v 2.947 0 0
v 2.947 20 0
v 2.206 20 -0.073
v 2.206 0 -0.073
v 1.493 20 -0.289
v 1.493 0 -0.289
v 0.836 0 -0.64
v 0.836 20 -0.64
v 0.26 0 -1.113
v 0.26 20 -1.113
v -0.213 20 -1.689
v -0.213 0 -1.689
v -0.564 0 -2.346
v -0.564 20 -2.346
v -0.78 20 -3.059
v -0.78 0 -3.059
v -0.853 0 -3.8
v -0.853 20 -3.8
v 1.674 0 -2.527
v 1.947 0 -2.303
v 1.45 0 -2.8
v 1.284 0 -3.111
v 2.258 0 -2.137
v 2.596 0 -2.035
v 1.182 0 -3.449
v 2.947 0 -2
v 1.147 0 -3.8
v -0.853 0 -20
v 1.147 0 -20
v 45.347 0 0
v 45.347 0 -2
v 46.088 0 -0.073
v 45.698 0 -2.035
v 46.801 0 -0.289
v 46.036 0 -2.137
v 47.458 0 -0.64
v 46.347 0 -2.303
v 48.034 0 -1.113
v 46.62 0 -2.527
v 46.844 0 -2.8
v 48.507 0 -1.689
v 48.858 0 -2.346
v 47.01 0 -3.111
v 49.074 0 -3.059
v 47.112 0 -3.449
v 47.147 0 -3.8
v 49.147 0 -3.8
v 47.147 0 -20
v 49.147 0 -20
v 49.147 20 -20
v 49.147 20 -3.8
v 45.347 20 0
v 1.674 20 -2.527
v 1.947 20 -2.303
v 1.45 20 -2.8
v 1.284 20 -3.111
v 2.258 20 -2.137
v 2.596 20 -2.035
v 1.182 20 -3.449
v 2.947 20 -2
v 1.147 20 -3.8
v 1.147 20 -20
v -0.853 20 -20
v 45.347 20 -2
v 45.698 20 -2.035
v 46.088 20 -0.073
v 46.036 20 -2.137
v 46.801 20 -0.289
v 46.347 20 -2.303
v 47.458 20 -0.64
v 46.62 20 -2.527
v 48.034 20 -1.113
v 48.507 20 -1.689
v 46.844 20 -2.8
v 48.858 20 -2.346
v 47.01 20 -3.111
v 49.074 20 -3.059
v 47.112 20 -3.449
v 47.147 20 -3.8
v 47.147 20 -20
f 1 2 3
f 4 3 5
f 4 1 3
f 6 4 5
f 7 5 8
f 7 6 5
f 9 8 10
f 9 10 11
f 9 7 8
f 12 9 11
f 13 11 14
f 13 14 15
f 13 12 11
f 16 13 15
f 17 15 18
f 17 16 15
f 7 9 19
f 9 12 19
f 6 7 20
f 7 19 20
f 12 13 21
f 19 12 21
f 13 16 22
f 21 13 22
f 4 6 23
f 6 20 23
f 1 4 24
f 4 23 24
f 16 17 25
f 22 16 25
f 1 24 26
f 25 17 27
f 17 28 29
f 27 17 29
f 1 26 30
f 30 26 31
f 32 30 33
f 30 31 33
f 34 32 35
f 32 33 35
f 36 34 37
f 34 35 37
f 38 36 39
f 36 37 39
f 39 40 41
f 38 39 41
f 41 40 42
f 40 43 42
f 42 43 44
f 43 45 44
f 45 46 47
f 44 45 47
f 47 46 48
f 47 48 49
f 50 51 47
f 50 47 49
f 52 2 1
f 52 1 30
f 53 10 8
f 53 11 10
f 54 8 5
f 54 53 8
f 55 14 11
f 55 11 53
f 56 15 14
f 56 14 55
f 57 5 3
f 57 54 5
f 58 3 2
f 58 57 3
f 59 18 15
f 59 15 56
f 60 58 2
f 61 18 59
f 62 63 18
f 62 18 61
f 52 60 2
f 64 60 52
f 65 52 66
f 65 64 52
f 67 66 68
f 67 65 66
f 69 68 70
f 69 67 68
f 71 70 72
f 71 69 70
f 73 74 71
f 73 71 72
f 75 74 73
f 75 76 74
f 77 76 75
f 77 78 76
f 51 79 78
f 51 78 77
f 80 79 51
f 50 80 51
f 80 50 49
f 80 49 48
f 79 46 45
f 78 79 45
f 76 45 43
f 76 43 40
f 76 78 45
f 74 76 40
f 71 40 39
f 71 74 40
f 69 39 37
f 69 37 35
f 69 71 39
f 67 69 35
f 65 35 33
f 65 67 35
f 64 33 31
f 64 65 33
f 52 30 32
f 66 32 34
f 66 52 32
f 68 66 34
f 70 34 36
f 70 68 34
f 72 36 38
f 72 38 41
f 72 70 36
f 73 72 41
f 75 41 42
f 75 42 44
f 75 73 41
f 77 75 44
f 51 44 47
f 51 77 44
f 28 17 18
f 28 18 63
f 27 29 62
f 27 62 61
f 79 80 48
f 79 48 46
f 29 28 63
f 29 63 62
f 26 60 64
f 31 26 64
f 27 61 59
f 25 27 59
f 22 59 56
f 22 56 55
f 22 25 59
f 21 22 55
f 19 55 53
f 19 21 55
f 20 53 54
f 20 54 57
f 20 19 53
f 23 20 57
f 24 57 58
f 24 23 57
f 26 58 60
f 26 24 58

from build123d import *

# Parameters (mm, degrees)
SKETCH1_W                      = 50
SKETCH1_H                      = 20
BASE_FLANGE1_DEPTH             = 2
EDGE_FLANGE1_STRIP_W           = 11.6
EDGE_FLANGE1_STRIP_H           = 2
EDGE_FLANGE1_STRIP_CUT_DEPTH   = 20
EDGE_FLANGE1_STRIP_2_W         = 11.6
EDGE_FLANGE1_STRIP_2_H         = 2
EDGE_FLANGE1_STRIP_CUT_2_DEPTH = 20
EDGE_FLANGE1_DEPTH             = 20
EDGE_FLANGE1_BEND_DEPTH        = 20


# Sheet-metal steps are written as plain solids
with BuildPart() as part:
    # Sketch1 → Base-Flange1 (new body)
    with BuildSketch(Plane.XY):
        with Locations((24.146981627, 10)):
            Rectangle(SKETCH1_W, SKETCH1_H)
    extrude(amount=-BASE_FLANGE1_DEPTH)

    # Edge-Flange1 strip (across the edge) → Edge-Flange1 strip cut (cut)
    with BuildSketch(Plane(origin=(-0.853018373, 0, -2), x_dir=(1, 0, 0), z_dir=(0, 1, 0))):
        with Locations((-2, -1)):
            Rectangle(EDGE_FLANGE1_STRIP_W, EDGE_FLANGE1_STRIP_H)
    extrude(amount=EDGE_FLANGE1_STRIP_CUT_DEPTH, mode=Mode.SUBTRACT)

    # Edge-Flange1 strip 2 (across the edge) → Edge-Flange1 strip cut 2 (cut)
    with BuildSketch(Plane(origin=(49.146981627, 20, -2), x_dir=(-1, 0, 0), z_dir=(0, -1, 0))):
        with Locations((-2, -1)):
            Rectangle(EDGE_FLANGE1_STRIP_2_W, EDGE_FLANGE1_STRIP_2_H)
    extrude(amount=EDGE_FLANGE1_STRIP_CUT_2_DEPTH, mode=Mode.SUBTRACT)

    # Edge-Flange1 section (across the edge) → Edge-Flange1 (add)
    with BuildSketch(Plane(origin=(-0.853018373, 0, -2), x_dir=(1, 0, 0), z_dir=(0, 1, 0))):
        with BuildLine():
            Line((0, 1.8), (0, 18))
            Line((0, 18), (2, 18))
            Line((2, 18), (2, 1.8))
            ThreePointArc((2, 1.8), (2.527207794, 0.527207794), (3.8, 0))
            Line((3.8, 0), (3.8, -2))
            ThreePointArc((3.8, -2), (1.112994231, -0.887005769), (0, 1.8))
        make_face()
    extrude(amount=EDGE_FLANGE1_DEPTH)

    # Edge-Flange1 section 2 (across the edge) → Edge-Flange1 bend (add)
    with BuildSketch(Plane(origin=(49.146981627, 20, -2), x_dir=(-1, 0, 0), z_dir=(0, -1, 0))):
        with BuildLine():
            Line((0, 1.8), (0, 18))
            Line((0, 18), (2, 18))
            Line((2, 18), (2, 1.8))
            ThreePointArc((2, 1.8), (2.527207794, 0.527207794), (3.8, 0))
            Line((3.8, 0), (3.8, -2))
            ThreePointArc((3.8, -2), (1.112994231, -0.887005769), (0, 1.8))
        make_face()
    extrude(amount=EDGE_FLANGE1_BEND_DEPTH)


solid = part.part
